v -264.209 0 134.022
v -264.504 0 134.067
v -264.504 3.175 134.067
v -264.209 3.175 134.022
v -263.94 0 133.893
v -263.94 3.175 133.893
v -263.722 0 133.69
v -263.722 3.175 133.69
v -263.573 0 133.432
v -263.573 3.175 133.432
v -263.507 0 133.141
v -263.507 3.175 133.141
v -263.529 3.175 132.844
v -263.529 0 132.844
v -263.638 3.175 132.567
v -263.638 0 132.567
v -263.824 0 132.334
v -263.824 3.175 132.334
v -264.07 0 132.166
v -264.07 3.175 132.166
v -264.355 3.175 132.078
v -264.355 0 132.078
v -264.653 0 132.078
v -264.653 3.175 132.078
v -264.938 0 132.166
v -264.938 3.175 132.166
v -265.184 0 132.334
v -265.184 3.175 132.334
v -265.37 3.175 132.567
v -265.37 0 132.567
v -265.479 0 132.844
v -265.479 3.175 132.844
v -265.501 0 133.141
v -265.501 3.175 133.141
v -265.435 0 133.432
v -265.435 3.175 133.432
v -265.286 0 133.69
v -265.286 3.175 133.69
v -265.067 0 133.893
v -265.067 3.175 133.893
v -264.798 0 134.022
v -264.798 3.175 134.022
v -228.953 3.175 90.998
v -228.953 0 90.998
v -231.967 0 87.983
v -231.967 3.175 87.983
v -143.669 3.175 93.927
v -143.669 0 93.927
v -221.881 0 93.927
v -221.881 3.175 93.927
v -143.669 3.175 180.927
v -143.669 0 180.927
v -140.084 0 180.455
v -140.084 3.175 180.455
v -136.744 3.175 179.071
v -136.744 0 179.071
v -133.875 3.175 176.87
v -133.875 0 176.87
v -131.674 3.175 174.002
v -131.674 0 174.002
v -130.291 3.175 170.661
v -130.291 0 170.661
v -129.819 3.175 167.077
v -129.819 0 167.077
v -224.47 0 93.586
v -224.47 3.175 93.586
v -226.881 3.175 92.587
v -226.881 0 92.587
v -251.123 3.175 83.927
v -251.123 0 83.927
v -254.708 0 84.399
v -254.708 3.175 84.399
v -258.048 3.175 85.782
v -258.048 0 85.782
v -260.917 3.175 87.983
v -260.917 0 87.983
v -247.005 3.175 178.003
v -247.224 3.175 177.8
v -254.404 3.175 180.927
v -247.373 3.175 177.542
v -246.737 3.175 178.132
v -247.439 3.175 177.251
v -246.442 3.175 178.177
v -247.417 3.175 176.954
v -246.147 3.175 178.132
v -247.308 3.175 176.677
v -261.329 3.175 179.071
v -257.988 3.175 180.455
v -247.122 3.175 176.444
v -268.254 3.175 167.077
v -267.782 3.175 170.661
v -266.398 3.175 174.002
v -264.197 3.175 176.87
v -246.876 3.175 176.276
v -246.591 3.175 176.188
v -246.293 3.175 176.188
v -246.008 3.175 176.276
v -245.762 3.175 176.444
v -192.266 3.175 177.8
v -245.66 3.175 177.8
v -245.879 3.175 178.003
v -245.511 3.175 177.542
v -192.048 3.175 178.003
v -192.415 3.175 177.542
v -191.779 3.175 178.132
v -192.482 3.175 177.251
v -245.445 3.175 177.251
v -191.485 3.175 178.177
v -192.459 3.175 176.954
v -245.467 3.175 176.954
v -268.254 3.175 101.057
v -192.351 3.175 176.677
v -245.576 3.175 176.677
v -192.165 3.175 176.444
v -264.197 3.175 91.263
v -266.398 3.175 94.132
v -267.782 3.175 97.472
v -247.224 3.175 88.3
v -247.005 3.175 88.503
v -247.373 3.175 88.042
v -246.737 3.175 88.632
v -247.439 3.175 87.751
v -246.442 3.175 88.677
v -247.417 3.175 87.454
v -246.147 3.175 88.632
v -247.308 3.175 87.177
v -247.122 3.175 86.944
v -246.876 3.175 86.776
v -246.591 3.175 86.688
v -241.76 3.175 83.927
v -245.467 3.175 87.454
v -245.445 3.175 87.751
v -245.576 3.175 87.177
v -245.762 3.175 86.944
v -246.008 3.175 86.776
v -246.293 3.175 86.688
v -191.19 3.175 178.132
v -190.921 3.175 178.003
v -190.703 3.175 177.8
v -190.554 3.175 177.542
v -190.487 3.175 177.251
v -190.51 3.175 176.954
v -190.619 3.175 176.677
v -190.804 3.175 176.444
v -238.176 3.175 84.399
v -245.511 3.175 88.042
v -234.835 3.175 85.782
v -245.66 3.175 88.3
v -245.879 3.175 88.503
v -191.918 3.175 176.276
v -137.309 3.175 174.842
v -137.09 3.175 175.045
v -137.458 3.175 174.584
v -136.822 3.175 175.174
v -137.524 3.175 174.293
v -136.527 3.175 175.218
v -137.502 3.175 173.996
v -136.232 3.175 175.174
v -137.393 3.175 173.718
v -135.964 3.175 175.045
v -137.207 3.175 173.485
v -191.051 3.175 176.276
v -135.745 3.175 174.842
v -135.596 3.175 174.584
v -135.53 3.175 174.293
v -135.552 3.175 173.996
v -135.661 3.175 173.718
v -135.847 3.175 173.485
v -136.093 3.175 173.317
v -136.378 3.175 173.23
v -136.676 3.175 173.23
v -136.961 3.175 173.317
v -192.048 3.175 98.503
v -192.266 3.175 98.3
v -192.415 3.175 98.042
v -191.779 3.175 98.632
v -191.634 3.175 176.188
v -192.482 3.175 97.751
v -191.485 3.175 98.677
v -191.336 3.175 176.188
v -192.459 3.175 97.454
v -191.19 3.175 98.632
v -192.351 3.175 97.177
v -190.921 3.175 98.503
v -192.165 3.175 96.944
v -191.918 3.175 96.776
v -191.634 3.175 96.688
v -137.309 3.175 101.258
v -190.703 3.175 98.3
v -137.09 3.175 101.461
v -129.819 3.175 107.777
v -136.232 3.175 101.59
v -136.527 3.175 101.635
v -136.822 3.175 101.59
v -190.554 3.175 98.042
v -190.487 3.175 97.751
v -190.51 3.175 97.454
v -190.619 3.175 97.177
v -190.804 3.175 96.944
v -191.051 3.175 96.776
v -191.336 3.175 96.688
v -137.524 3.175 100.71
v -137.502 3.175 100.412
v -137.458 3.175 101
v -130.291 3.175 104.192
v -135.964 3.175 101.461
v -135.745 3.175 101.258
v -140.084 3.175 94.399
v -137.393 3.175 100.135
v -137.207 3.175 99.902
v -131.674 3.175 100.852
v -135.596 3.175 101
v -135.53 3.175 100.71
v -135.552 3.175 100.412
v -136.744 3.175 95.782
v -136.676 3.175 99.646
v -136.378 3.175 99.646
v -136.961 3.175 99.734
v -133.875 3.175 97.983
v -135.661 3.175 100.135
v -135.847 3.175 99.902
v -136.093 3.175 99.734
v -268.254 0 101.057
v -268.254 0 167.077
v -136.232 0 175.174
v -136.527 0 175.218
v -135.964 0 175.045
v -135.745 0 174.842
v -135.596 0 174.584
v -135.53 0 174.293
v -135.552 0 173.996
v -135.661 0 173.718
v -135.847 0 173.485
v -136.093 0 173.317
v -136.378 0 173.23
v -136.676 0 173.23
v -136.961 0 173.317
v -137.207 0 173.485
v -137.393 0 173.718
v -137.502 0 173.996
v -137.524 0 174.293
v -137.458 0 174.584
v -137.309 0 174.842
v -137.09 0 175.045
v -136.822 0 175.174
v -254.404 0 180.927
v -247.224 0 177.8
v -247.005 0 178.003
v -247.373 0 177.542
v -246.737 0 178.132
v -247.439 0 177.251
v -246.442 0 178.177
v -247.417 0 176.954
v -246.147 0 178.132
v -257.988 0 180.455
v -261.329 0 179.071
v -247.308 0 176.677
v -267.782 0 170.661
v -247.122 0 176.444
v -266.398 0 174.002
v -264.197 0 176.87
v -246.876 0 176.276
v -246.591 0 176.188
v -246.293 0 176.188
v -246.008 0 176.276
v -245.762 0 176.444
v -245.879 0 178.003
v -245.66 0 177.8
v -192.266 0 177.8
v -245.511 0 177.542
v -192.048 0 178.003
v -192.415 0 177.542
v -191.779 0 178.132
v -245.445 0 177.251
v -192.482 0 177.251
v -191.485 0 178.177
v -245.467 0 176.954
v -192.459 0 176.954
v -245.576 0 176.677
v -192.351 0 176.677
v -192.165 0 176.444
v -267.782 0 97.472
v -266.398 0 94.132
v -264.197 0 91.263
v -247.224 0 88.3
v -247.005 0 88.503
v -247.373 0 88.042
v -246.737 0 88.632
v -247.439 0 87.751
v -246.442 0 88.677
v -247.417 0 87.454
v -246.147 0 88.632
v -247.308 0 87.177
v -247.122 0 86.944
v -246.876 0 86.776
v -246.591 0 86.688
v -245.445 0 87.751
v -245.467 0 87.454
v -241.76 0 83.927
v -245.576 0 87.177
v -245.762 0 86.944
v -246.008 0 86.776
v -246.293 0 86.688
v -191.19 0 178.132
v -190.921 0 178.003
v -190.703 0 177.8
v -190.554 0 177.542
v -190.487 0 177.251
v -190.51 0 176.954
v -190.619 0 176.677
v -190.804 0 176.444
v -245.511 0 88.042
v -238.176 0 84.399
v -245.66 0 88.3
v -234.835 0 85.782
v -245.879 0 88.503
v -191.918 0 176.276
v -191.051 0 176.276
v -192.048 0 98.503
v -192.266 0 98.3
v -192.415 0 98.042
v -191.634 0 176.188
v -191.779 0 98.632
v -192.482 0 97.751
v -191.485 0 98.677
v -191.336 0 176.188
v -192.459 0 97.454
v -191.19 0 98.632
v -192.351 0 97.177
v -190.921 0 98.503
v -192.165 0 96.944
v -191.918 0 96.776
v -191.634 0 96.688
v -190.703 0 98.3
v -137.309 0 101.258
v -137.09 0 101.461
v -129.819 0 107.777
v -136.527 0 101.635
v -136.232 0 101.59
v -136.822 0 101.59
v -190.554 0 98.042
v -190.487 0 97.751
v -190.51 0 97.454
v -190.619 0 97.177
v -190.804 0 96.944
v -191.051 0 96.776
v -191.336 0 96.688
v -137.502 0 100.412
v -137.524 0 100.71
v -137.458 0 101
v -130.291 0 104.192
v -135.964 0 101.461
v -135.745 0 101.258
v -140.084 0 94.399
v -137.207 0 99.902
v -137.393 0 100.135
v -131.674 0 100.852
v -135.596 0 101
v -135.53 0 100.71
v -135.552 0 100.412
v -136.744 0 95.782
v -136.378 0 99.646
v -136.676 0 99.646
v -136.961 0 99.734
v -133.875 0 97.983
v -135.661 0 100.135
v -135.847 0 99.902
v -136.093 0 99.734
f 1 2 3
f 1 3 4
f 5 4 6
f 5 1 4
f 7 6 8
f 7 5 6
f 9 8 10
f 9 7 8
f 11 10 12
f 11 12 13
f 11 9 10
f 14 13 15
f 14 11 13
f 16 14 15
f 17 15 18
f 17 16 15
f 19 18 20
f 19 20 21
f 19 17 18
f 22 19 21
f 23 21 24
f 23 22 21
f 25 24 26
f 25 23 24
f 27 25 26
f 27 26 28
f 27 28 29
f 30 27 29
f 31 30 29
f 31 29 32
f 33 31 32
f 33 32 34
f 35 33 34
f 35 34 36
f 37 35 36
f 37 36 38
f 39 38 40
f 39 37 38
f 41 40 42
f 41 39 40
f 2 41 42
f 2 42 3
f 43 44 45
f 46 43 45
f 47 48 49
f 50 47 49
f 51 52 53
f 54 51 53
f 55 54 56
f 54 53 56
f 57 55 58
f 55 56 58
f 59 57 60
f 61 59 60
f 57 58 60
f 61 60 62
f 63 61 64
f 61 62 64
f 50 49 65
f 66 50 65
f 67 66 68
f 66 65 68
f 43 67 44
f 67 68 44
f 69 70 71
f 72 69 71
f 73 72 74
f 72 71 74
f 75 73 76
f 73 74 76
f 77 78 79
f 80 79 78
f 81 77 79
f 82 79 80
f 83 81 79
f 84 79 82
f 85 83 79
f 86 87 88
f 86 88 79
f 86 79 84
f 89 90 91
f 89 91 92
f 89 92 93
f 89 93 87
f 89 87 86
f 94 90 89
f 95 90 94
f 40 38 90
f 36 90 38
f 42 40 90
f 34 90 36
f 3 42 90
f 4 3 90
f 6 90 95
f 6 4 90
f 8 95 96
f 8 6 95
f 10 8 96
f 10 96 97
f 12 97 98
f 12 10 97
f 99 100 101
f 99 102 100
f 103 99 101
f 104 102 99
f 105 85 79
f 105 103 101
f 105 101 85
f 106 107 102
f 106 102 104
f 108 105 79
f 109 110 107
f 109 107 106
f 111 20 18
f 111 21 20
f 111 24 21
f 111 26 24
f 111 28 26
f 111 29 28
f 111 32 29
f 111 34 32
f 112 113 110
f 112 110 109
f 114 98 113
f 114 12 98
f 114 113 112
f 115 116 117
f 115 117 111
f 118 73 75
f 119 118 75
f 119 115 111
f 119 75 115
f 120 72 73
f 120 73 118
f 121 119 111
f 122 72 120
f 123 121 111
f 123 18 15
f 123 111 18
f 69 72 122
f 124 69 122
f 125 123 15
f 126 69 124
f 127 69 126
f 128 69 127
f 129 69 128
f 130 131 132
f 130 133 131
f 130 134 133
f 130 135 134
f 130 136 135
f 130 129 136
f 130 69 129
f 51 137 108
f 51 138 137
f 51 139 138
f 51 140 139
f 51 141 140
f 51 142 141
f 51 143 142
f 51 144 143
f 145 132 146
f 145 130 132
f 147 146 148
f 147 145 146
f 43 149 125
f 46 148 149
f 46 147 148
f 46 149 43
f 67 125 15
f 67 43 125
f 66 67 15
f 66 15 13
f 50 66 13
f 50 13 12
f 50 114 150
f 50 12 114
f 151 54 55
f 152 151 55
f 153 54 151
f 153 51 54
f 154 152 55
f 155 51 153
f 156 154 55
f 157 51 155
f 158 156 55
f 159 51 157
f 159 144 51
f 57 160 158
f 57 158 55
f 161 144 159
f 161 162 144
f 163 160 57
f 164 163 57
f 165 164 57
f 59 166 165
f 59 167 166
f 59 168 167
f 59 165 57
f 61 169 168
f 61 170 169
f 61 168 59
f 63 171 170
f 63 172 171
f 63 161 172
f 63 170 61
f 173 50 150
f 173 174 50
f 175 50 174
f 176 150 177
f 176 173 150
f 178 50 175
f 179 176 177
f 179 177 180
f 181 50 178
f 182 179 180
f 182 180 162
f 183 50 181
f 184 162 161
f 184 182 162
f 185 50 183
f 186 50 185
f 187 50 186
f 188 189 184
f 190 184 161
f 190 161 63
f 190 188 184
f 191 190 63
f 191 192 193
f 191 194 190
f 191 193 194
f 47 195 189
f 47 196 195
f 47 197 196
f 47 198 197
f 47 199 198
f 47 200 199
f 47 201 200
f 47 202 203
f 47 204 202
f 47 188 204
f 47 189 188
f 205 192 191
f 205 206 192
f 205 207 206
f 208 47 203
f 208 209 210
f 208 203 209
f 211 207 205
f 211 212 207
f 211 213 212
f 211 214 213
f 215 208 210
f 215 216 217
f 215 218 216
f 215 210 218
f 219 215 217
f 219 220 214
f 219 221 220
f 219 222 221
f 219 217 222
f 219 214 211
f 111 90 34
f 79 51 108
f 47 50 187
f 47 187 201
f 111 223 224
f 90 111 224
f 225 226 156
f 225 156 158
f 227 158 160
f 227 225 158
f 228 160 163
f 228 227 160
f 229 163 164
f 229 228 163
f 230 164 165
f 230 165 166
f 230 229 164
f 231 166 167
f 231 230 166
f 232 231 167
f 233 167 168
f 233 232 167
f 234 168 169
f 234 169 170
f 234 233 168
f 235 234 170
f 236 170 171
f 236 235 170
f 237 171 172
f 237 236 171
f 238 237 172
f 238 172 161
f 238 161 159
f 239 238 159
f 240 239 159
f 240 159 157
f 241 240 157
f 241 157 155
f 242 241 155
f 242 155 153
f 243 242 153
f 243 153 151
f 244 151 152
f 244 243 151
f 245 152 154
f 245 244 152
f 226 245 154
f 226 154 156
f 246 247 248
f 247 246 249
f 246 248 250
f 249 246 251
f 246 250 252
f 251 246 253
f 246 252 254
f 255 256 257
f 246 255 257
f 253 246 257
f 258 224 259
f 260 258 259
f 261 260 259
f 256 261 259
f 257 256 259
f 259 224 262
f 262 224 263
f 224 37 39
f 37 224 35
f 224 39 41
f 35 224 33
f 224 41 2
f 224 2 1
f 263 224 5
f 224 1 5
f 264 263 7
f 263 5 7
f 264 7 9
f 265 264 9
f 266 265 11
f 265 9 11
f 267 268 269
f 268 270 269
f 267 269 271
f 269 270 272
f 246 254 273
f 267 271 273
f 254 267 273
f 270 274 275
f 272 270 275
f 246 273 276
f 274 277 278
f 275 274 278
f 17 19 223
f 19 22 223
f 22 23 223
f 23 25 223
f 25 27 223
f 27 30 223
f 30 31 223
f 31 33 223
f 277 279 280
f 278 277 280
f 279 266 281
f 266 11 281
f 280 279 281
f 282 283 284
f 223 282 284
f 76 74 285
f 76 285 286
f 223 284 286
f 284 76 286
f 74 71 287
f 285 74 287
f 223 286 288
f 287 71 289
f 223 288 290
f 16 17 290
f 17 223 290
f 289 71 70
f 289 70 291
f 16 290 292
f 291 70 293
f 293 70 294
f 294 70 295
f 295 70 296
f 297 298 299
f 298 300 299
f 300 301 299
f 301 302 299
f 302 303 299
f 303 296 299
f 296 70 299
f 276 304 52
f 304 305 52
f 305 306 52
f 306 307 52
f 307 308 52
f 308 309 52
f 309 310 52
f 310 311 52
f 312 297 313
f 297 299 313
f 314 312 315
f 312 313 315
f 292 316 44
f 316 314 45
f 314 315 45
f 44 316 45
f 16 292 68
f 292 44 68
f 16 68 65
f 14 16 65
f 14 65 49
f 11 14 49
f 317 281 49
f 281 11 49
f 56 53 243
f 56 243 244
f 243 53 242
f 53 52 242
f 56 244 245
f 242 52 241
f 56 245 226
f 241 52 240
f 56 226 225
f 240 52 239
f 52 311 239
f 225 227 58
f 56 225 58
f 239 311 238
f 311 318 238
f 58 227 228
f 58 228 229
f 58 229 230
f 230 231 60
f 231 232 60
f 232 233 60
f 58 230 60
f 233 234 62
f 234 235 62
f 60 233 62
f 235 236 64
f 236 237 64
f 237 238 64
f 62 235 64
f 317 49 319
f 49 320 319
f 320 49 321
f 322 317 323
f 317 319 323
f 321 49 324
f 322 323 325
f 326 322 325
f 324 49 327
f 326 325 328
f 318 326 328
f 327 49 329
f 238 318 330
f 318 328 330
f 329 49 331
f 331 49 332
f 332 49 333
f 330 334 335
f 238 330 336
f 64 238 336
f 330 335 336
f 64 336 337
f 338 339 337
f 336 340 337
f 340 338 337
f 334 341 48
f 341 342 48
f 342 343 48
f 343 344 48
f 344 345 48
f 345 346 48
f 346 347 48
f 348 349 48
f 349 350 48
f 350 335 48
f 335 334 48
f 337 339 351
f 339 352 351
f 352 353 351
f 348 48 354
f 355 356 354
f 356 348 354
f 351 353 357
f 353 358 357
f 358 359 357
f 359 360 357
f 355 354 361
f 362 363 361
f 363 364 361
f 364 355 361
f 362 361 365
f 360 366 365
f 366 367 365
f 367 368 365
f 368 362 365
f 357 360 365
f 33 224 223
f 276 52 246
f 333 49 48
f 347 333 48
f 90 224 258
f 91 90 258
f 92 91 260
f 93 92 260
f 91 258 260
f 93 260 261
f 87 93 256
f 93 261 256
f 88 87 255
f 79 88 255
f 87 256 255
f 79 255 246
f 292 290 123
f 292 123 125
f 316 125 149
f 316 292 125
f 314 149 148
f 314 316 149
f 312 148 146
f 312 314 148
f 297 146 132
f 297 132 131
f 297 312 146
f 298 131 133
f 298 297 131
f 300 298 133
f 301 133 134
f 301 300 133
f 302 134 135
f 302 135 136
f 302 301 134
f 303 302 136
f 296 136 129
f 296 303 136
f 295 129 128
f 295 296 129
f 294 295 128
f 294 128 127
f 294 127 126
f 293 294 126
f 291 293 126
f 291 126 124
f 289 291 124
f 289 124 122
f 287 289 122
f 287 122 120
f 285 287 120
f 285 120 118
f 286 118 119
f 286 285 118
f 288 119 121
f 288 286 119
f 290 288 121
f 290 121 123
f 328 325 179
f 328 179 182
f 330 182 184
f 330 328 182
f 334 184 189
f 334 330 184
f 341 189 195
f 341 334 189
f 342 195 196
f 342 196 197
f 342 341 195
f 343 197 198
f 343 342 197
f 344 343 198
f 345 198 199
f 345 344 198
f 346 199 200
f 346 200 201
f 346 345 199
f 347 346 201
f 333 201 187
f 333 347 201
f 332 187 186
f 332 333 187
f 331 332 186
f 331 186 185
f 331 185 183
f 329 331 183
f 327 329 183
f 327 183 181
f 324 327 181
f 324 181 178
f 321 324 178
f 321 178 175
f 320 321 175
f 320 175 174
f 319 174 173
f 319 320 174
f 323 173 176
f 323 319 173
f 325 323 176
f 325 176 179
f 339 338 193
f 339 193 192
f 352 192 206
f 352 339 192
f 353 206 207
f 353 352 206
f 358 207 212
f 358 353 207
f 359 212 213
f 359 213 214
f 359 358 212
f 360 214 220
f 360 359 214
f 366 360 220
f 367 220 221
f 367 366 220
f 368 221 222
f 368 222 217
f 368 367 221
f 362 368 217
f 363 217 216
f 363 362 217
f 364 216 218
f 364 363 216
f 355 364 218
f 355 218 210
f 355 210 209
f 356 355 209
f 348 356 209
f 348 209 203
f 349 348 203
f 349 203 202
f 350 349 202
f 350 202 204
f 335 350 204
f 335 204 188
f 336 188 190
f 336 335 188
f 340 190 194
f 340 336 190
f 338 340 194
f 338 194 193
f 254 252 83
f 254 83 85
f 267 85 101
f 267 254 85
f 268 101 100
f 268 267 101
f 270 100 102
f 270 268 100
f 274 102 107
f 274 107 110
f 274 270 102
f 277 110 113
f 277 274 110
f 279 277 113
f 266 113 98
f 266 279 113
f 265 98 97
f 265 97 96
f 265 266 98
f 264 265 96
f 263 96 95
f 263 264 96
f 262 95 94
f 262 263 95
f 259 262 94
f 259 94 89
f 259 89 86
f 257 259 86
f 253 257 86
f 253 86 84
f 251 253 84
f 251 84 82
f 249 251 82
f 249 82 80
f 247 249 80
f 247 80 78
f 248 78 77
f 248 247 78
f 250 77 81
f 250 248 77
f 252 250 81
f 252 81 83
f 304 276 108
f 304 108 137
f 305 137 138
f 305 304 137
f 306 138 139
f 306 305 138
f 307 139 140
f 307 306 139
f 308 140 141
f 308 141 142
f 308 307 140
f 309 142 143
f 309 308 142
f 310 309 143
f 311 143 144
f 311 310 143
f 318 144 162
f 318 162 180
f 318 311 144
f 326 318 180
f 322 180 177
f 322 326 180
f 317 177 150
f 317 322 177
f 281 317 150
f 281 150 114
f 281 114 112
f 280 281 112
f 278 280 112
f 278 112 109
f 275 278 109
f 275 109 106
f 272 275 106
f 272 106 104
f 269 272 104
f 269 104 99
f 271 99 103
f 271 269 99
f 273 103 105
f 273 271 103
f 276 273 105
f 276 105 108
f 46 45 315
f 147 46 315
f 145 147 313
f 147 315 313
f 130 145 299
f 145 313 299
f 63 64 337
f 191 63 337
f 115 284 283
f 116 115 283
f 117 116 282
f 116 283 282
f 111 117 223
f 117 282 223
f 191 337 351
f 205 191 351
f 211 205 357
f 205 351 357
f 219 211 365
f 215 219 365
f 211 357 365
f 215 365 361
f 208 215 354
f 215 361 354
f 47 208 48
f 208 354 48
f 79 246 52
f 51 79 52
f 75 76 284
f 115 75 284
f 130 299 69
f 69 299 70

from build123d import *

# Parameters (mm, degrees)
SKETCH1_R           = 1
BOSS_EXTRUDE1_DEPTH = 3.175


with BuildPart() as part:
    # Sketch1 → Boss-Extrude1 (new body)
    with BuildSketch(Plane(origin=(0, 0, 0), x_dir=(1, 0, 0), z_dir=(0, 1, 0))):
        with BuildLine():
            Line((-268.253734697, -101.056878234), (-268.253734697, -167.076622113))
            ThreePointArc((-268.253734697, -167.076622113), (-264.197163616, -176.870051033), (-254.403734697, -180.926622113))
            Line((-254.403734697, -180.926622113), (-143.66889433, -180.926622113))
            ThreePointArc((-143.66889433, -180.926622113), (-133.87546541, -176.870051033), (-129.81889433, -167.076622113))
            Line((-129.81889433, -167.076622113), (-129.81889433, -107.776622113))
            ThreePointArc((-129.81889433, -107.776622113), (-133.87546541, -97.983193194), (-143.66889433, -93.926622113))
            Line((-143.66889433, -93.926622113), (-221.881483076, -93.926622113))
            ThreePointArc((-221.881483076, -93.926622113), (-225.7083174, -93.165417438), (-228.952550888, -90.997689925))
            Line((-228.952550888, -90.997689925), (-231.967047619, -87.983193194))
            ThreePointArc((-231.967047619, -87.983193194), (-236.460311001, -84.980890588), (-241.760476539, -83.926622113))
            Line((-241.760476539, -83.926622113), (-251.123478576, -83.926622113))
            ThreePointArc((-251.123478576, -83.926622113), (-256.423644114, -84.980890588), (-260.916907495, -87.983193194))
            Line((-260.916907495, -87.983193194), (-264.197163616, -91.263449315))
            ThreePointArc((-264.197163616, -91.263449315), (-267.199466222, -95.756712696), (-268.253734697, -101.056878234))
        make_face()
        with Locations(Location((-246.441977557, -177.176622113, 0), (0, 0, 270))):
            Circle(SKETCH1_R, mode=Mode.SUBTRACT)
        with Locations(Location((-264.503734697, -133.066750174, 0), (0, 0, 270))):
            Circle(SKETCH1_R, mode=Mode.SUBTRACT)
        with Locations(Location((-246.441977557, -87.676622113, 0), (0, 0, 270))):
            Circle(SKETCH1_R, mode=Mode.SUBTRACT)
        with Locations(Location((-191.484546698, -97.676622113, 0), (0, 0, 270))):
            Circle(SKETCH1_R, mode=Mode.SUBTRACT)
        with Locations(Location((-136.52711584, -100.634843623, 0), (0, 0, 270))):
            Circle(SKETCH1_R, mode=Mode.SUBTRACT)
        with Locations(Location((-136.52711584, -174.218400603, 0), (0, 0, 270))):
            Circle(SKETCH1_R, mode=Mode.SUBTRACT)
        with Locations(Location((-191.484546698, -177.176622113, 0), (0, 0, 270))):
            Circle(SKETCH1_R, mode=Mode.SUBTRACT)
    extrude(amount=BOSS_EXTRUDE1_DEPTH)


solid = part.part
